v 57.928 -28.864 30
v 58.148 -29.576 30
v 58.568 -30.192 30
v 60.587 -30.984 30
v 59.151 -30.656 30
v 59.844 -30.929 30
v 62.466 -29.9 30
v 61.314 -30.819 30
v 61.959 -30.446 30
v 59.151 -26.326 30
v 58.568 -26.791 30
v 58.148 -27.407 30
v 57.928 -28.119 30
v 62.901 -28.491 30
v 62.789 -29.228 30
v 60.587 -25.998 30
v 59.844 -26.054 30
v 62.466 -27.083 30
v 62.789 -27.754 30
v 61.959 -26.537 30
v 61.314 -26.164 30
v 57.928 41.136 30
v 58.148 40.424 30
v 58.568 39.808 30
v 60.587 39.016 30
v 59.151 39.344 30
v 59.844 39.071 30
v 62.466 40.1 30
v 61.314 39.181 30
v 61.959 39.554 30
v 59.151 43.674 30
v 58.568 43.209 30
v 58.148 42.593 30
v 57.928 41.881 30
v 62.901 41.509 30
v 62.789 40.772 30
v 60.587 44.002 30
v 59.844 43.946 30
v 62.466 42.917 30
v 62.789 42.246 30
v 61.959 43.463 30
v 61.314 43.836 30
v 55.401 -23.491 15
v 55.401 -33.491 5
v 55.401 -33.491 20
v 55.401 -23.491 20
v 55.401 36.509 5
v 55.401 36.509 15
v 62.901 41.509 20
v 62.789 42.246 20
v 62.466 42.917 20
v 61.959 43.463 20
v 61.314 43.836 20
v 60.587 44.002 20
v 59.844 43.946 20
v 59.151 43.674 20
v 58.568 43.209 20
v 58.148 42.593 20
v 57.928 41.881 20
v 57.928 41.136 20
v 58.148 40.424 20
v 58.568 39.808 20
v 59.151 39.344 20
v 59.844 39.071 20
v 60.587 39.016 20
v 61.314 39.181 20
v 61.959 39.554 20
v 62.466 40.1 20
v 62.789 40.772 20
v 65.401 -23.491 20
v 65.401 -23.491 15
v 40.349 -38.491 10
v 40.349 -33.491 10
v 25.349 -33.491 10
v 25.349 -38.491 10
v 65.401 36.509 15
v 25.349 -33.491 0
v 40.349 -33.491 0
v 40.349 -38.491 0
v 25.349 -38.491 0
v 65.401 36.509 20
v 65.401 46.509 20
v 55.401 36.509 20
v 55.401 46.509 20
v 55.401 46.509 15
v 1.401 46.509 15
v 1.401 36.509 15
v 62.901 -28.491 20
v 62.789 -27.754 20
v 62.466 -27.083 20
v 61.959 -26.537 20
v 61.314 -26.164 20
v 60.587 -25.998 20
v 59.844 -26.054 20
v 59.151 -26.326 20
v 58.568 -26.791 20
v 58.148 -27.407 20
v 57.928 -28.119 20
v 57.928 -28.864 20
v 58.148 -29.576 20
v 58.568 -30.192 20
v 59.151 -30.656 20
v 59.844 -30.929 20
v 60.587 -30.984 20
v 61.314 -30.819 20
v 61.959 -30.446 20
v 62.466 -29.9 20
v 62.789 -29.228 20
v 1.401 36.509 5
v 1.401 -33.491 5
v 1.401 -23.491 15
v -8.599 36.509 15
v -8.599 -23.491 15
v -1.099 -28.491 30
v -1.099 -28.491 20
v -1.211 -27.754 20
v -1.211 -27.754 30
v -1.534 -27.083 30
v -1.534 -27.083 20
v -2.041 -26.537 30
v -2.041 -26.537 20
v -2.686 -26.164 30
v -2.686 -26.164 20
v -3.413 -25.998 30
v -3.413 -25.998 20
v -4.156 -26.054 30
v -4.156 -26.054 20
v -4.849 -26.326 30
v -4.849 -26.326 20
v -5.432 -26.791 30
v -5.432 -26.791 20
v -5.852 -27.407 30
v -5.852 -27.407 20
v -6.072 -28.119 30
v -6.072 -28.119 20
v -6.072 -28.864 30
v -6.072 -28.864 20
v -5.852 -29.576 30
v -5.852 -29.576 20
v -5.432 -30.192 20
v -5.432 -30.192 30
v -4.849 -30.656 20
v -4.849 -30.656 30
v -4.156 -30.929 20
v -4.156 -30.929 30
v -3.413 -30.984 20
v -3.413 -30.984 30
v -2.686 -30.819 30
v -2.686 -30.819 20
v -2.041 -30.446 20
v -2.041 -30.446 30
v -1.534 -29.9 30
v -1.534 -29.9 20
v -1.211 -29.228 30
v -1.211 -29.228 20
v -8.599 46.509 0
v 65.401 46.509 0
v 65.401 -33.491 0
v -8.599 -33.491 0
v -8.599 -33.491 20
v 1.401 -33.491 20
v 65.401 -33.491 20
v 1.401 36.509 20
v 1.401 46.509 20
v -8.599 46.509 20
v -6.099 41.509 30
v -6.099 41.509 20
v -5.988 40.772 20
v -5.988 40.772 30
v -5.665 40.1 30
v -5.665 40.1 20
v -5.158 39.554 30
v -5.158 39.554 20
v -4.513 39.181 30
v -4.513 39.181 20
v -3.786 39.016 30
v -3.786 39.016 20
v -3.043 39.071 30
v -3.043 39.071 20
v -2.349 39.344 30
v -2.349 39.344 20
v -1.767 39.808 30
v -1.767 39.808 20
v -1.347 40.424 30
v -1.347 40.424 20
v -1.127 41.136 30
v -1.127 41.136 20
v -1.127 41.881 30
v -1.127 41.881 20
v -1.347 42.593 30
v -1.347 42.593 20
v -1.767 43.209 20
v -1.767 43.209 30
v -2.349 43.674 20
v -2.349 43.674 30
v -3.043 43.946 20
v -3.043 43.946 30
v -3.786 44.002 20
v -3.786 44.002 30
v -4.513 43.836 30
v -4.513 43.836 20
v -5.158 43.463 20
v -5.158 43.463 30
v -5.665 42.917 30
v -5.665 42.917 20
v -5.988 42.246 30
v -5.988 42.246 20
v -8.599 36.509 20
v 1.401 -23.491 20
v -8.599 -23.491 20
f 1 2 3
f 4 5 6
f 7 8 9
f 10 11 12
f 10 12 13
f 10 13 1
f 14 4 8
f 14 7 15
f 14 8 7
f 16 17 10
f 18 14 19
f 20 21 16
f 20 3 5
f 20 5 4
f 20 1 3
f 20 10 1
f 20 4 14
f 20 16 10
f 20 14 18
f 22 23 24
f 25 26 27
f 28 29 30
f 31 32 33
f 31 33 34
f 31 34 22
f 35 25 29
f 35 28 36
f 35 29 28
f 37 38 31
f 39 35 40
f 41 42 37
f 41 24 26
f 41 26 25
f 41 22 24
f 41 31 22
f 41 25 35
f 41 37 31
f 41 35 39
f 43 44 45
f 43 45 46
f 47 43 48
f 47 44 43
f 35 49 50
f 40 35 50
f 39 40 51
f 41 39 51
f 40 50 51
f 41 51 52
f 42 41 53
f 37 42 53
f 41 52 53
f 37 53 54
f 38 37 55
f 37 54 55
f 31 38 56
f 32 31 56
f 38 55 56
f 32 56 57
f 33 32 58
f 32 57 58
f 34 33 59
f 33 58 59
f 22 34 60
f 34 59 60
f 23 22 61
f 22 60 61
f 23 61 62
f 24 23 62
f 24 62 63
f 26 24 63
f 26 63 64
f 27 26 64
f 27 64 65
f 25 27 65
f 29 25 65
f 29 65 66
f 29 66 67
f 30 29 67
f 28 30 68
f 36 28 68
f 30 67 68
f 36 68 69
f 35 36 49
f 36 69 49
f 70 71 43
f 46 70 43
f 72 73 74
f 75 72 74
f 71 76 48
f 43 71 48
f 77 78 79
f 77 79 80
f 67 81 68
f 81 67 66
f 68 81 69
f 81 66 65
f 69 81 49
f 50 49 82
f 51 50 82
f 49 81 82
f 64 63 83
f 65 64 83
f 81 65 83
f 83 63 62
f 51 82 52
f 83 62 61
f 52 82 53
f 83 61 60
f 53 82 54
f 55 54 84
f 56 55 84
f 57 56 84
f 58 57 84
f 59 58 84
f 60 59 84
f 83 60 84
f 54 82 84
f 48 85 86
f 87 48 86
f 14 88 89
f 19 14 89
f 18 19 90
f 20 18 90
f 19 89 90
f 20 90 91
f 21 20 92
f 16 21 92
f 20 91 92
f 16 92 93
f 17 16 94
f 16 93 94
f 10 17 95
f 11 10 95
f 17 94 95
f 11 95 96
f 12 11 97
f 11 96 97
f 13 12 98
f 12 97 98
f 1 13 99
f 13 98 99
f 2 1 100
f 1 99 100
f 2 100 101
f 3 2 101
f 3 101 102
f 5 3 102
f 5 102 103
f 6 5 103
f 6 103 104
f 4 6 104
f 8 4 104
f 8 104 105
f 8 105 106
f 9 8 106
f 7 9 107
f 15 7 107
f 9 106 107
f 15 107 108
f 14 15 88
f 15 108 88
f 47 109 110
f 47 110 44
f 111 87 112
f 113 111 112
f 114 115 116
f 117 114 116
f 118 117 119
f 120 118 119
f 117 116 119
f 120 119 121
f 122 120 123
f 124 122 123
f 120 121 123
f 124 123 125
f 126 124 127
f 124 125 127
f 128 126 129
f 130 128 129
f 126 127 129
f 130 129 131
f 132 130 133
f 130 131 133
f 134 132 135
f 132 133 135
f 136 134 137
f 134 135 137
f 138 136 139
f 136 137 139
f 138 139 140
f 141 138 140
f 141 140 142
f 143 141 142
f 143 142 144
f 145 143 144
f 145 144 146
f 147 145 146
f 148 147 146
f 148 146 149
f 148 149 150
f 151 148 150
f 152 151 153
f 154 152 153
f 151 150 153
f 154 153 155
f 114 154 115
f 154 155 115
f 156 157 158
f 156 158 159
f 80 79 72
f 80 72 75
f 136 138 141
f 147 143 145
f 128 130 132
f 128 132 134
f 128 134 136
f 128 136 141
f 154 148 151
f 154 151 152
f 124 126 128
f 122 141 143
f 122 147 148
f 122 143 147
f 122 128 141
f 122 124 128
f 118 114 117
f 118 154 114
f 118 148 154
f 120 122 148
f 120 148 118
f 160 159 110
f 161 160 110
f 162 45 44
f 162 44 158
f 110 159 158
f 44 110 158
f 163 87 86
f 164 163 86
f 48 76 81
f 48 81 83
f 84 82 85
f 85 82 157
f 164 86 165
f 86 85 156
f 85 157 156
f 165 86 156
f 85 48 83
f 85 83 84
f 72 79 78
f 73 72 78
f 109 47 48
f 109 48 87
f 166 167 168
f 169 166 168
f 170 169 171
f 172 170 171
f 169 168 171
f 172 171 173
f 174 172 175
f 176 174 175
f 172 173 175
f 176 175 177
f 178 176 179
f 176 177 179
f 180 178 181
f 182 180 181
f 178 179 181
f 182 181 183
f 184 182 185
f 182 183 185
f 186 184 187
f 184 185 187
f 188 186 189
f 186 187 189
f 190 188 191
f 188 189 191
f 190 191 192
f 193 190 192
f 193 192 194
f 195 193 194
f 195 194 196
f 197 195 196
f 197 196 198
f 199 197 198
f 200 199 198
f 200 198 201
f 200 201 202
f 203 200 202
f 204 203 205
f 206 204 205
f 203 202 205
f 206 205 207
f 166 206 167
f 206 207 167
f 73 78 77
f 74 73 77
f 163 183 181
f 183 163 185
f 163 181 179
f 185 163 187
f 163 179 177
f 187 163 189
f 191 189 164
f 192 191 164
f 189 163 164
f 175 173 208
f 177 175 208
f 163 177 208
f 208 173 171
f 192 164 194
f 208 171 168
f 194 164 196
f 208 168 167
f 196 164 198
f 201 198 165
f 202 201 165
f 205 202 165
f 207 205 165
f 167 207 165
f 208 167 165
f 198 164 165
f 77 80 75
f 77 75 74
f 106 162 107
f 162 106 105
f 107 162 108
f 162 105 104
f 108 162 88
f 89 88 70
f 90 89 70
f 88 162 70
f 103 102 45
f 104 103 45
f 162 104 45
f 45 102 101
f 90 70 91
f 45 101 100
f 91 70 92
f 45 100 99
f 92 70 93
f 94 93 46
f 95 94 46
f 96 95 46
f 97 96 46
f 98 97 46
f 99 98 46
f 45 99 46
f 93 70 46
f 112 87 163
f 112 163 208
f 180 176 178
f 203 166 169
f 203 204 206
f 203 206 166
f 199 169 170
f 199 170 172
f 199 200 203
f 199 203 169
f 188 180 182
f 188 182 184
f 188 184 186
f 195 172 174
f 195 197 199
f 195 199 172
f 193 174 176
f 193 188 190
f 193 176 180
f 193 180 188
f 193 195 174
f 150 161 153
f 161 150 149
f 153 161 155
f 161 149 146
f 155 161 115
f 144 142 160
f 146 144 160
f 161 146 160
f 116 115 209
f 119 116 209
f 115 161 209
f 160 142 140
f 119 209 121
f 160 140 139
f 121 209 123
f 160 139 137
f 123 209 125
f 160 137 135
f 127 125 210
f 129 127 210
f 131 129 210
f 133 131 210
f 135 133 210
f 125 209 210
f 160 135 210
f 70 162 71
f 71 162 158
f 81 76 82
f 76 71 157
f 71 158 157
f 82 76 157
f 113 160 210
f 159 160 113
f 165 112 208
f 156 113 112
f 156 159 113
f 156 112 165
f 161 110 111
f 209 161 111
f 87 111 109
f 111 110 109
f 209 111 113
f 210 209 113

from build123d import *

# Parameters (mm, degrees)
CROQUIS1_W               = 54
CROQUIS1_H               = 70
SALIENTE_EXTRUIR1_DEPTH  = 5
CROQUIS4_W               = 54
CROQUIS4_H               = 10
SALIENTE_EXTRUIR5_DEPTH  = 15
CROQUIS5_W               = 10
CROQUIS5_H               = 10
SALIENTE_EXTRUIR6_DEPTH  = 20
CROQUIS6_W               = 15
CROQUIS6_H               = 5
SALIENTE_EXTRUIR7_DEPTH  = 10
CROQUIS8_W               = 10
CROQUIS8_H               = 60
SALIENTE_EXTRUIR9_DEPTH  = 15
CROQUIS9_R               = 2.5
SALIENTE_EXTRUIR10_DEPTH = 10


with BuildPart() as part:
    # Croquis1 → Saliente-Extruir1 (new body)
    with BuildSketch(Plane.XY):
        with Locations((28.400543811, 1.50863747)):
            Rectangle(CROQUIS1_W, CROQUIS1_H)
    extrude(amount=SALIENTE_EXTRUIR1_DEPTH)

    # Croquis4 → Saliente-Extruir5 (add)
    with BuildSketch(Plane(origin=(0, 0, 0), x_dir=(-1, 0, 0), z_dir=(0, 0, -1))):
        with Locations((-28.400543811, 41.50863747)):
            Rectangle(CROQUIS4_W, CROQUIS4_H)
    extrude(amount=-SALIENTE_EXTRUIR5_DEPTH)

    # Croquis5 → Saliente-Extruir6 (add)
    with BuildSketch(Plane(origin=(0, 0, 0), x_dir=(-1, 0, 0), z_dir=(0, 0, -1))):
        with Locations((-60.400543811, 41.50863747)):
            Rectangle(CROQUIS5_W, CROQUIS5_H)
        with Locations((-60.400543811, -28.49136253)):
            Rectangle(CROQUIS5_W, CROQUIS5_H)
        with Locations((3.599456189, -28.49136253)):
            Rectangle(CROQUIS5_W, CROQUIS5_H)
        with Locations((3.599456189, 41.50863747)):
            Rectangle(CROQUIS5_W, CROQUIS5_H)
    extrude(amount=-SALIENTE_EXTRUIR6_DEPTH)

    # Croquis8 → Saliente-Extruir9 (add)
    with BuildSketch(Plane(origin=(0, 0, 0), x_dir=(-1, 0, 0), z_dir=(0, 0, -1))):
        with Locations((-60.400543811, 6.50863747)):
            Rectangle(CROQUIS8_W, CROQUIS8_H)
        with Locations((3.599456189, 6.50863747)):
            Rectangle(CROQUIS8_W, CROQUIS8_H)
    extrude(amount=-SALIENTE_EXTRUIR9_DEPTH)

    # Croquis9 → Saliente-Extruir10 (add)
    with BuildSketch(Plane.XY.offset(20)):
        with BuildLine():
            ThreePointArc((-1.099456189, 41.50863747), (-3.599456189, 44.00863747), (-6.099456189, 41.50863747))
            Line((-6.099456189, 41.50863747), (-1.099456189, 41.50863747))
        make_face()
        with BuildLine():
            Line((-1.099456189, 41.50863747), (-6.099456189, 41.50863747))
            ThreePointArc((-6.099456189, 41.50863747), (-3.599456189, 39.00863747), (-1.099456189, 41.50863747))
        make_face()
        with Locations((60.400543811, 41.50863747)):
            Circle(CROQUIS9_R)
        with Locations((60.400543811, -28.49136253)):
            Circle(CROQUIS9_R)
        with Locations((-3.599456189, -28.49136253)):
            Circle(CROQUIS9_R)
    extrude(amount=SALIENTE_EXTRUIR10_DEPTH)


with BuildPart() as body_2:
    # Croquis6 → Saliente-Extruir7 (new body)
    with BuildSketch(Plane(origin=(0, 0, 0), x_dir=(-1, 0, 0), z_dir=(0, 0, -1))):
        with Locations((-32.848967284, -35.99136253)):
            Rectangle(CROQUIS6_W, CROQUIS6_H)
    extrude(amount=-SALIENTE_EXTRUIR7_DEPTH)


solid = Compound([part.part, body_2.part])
